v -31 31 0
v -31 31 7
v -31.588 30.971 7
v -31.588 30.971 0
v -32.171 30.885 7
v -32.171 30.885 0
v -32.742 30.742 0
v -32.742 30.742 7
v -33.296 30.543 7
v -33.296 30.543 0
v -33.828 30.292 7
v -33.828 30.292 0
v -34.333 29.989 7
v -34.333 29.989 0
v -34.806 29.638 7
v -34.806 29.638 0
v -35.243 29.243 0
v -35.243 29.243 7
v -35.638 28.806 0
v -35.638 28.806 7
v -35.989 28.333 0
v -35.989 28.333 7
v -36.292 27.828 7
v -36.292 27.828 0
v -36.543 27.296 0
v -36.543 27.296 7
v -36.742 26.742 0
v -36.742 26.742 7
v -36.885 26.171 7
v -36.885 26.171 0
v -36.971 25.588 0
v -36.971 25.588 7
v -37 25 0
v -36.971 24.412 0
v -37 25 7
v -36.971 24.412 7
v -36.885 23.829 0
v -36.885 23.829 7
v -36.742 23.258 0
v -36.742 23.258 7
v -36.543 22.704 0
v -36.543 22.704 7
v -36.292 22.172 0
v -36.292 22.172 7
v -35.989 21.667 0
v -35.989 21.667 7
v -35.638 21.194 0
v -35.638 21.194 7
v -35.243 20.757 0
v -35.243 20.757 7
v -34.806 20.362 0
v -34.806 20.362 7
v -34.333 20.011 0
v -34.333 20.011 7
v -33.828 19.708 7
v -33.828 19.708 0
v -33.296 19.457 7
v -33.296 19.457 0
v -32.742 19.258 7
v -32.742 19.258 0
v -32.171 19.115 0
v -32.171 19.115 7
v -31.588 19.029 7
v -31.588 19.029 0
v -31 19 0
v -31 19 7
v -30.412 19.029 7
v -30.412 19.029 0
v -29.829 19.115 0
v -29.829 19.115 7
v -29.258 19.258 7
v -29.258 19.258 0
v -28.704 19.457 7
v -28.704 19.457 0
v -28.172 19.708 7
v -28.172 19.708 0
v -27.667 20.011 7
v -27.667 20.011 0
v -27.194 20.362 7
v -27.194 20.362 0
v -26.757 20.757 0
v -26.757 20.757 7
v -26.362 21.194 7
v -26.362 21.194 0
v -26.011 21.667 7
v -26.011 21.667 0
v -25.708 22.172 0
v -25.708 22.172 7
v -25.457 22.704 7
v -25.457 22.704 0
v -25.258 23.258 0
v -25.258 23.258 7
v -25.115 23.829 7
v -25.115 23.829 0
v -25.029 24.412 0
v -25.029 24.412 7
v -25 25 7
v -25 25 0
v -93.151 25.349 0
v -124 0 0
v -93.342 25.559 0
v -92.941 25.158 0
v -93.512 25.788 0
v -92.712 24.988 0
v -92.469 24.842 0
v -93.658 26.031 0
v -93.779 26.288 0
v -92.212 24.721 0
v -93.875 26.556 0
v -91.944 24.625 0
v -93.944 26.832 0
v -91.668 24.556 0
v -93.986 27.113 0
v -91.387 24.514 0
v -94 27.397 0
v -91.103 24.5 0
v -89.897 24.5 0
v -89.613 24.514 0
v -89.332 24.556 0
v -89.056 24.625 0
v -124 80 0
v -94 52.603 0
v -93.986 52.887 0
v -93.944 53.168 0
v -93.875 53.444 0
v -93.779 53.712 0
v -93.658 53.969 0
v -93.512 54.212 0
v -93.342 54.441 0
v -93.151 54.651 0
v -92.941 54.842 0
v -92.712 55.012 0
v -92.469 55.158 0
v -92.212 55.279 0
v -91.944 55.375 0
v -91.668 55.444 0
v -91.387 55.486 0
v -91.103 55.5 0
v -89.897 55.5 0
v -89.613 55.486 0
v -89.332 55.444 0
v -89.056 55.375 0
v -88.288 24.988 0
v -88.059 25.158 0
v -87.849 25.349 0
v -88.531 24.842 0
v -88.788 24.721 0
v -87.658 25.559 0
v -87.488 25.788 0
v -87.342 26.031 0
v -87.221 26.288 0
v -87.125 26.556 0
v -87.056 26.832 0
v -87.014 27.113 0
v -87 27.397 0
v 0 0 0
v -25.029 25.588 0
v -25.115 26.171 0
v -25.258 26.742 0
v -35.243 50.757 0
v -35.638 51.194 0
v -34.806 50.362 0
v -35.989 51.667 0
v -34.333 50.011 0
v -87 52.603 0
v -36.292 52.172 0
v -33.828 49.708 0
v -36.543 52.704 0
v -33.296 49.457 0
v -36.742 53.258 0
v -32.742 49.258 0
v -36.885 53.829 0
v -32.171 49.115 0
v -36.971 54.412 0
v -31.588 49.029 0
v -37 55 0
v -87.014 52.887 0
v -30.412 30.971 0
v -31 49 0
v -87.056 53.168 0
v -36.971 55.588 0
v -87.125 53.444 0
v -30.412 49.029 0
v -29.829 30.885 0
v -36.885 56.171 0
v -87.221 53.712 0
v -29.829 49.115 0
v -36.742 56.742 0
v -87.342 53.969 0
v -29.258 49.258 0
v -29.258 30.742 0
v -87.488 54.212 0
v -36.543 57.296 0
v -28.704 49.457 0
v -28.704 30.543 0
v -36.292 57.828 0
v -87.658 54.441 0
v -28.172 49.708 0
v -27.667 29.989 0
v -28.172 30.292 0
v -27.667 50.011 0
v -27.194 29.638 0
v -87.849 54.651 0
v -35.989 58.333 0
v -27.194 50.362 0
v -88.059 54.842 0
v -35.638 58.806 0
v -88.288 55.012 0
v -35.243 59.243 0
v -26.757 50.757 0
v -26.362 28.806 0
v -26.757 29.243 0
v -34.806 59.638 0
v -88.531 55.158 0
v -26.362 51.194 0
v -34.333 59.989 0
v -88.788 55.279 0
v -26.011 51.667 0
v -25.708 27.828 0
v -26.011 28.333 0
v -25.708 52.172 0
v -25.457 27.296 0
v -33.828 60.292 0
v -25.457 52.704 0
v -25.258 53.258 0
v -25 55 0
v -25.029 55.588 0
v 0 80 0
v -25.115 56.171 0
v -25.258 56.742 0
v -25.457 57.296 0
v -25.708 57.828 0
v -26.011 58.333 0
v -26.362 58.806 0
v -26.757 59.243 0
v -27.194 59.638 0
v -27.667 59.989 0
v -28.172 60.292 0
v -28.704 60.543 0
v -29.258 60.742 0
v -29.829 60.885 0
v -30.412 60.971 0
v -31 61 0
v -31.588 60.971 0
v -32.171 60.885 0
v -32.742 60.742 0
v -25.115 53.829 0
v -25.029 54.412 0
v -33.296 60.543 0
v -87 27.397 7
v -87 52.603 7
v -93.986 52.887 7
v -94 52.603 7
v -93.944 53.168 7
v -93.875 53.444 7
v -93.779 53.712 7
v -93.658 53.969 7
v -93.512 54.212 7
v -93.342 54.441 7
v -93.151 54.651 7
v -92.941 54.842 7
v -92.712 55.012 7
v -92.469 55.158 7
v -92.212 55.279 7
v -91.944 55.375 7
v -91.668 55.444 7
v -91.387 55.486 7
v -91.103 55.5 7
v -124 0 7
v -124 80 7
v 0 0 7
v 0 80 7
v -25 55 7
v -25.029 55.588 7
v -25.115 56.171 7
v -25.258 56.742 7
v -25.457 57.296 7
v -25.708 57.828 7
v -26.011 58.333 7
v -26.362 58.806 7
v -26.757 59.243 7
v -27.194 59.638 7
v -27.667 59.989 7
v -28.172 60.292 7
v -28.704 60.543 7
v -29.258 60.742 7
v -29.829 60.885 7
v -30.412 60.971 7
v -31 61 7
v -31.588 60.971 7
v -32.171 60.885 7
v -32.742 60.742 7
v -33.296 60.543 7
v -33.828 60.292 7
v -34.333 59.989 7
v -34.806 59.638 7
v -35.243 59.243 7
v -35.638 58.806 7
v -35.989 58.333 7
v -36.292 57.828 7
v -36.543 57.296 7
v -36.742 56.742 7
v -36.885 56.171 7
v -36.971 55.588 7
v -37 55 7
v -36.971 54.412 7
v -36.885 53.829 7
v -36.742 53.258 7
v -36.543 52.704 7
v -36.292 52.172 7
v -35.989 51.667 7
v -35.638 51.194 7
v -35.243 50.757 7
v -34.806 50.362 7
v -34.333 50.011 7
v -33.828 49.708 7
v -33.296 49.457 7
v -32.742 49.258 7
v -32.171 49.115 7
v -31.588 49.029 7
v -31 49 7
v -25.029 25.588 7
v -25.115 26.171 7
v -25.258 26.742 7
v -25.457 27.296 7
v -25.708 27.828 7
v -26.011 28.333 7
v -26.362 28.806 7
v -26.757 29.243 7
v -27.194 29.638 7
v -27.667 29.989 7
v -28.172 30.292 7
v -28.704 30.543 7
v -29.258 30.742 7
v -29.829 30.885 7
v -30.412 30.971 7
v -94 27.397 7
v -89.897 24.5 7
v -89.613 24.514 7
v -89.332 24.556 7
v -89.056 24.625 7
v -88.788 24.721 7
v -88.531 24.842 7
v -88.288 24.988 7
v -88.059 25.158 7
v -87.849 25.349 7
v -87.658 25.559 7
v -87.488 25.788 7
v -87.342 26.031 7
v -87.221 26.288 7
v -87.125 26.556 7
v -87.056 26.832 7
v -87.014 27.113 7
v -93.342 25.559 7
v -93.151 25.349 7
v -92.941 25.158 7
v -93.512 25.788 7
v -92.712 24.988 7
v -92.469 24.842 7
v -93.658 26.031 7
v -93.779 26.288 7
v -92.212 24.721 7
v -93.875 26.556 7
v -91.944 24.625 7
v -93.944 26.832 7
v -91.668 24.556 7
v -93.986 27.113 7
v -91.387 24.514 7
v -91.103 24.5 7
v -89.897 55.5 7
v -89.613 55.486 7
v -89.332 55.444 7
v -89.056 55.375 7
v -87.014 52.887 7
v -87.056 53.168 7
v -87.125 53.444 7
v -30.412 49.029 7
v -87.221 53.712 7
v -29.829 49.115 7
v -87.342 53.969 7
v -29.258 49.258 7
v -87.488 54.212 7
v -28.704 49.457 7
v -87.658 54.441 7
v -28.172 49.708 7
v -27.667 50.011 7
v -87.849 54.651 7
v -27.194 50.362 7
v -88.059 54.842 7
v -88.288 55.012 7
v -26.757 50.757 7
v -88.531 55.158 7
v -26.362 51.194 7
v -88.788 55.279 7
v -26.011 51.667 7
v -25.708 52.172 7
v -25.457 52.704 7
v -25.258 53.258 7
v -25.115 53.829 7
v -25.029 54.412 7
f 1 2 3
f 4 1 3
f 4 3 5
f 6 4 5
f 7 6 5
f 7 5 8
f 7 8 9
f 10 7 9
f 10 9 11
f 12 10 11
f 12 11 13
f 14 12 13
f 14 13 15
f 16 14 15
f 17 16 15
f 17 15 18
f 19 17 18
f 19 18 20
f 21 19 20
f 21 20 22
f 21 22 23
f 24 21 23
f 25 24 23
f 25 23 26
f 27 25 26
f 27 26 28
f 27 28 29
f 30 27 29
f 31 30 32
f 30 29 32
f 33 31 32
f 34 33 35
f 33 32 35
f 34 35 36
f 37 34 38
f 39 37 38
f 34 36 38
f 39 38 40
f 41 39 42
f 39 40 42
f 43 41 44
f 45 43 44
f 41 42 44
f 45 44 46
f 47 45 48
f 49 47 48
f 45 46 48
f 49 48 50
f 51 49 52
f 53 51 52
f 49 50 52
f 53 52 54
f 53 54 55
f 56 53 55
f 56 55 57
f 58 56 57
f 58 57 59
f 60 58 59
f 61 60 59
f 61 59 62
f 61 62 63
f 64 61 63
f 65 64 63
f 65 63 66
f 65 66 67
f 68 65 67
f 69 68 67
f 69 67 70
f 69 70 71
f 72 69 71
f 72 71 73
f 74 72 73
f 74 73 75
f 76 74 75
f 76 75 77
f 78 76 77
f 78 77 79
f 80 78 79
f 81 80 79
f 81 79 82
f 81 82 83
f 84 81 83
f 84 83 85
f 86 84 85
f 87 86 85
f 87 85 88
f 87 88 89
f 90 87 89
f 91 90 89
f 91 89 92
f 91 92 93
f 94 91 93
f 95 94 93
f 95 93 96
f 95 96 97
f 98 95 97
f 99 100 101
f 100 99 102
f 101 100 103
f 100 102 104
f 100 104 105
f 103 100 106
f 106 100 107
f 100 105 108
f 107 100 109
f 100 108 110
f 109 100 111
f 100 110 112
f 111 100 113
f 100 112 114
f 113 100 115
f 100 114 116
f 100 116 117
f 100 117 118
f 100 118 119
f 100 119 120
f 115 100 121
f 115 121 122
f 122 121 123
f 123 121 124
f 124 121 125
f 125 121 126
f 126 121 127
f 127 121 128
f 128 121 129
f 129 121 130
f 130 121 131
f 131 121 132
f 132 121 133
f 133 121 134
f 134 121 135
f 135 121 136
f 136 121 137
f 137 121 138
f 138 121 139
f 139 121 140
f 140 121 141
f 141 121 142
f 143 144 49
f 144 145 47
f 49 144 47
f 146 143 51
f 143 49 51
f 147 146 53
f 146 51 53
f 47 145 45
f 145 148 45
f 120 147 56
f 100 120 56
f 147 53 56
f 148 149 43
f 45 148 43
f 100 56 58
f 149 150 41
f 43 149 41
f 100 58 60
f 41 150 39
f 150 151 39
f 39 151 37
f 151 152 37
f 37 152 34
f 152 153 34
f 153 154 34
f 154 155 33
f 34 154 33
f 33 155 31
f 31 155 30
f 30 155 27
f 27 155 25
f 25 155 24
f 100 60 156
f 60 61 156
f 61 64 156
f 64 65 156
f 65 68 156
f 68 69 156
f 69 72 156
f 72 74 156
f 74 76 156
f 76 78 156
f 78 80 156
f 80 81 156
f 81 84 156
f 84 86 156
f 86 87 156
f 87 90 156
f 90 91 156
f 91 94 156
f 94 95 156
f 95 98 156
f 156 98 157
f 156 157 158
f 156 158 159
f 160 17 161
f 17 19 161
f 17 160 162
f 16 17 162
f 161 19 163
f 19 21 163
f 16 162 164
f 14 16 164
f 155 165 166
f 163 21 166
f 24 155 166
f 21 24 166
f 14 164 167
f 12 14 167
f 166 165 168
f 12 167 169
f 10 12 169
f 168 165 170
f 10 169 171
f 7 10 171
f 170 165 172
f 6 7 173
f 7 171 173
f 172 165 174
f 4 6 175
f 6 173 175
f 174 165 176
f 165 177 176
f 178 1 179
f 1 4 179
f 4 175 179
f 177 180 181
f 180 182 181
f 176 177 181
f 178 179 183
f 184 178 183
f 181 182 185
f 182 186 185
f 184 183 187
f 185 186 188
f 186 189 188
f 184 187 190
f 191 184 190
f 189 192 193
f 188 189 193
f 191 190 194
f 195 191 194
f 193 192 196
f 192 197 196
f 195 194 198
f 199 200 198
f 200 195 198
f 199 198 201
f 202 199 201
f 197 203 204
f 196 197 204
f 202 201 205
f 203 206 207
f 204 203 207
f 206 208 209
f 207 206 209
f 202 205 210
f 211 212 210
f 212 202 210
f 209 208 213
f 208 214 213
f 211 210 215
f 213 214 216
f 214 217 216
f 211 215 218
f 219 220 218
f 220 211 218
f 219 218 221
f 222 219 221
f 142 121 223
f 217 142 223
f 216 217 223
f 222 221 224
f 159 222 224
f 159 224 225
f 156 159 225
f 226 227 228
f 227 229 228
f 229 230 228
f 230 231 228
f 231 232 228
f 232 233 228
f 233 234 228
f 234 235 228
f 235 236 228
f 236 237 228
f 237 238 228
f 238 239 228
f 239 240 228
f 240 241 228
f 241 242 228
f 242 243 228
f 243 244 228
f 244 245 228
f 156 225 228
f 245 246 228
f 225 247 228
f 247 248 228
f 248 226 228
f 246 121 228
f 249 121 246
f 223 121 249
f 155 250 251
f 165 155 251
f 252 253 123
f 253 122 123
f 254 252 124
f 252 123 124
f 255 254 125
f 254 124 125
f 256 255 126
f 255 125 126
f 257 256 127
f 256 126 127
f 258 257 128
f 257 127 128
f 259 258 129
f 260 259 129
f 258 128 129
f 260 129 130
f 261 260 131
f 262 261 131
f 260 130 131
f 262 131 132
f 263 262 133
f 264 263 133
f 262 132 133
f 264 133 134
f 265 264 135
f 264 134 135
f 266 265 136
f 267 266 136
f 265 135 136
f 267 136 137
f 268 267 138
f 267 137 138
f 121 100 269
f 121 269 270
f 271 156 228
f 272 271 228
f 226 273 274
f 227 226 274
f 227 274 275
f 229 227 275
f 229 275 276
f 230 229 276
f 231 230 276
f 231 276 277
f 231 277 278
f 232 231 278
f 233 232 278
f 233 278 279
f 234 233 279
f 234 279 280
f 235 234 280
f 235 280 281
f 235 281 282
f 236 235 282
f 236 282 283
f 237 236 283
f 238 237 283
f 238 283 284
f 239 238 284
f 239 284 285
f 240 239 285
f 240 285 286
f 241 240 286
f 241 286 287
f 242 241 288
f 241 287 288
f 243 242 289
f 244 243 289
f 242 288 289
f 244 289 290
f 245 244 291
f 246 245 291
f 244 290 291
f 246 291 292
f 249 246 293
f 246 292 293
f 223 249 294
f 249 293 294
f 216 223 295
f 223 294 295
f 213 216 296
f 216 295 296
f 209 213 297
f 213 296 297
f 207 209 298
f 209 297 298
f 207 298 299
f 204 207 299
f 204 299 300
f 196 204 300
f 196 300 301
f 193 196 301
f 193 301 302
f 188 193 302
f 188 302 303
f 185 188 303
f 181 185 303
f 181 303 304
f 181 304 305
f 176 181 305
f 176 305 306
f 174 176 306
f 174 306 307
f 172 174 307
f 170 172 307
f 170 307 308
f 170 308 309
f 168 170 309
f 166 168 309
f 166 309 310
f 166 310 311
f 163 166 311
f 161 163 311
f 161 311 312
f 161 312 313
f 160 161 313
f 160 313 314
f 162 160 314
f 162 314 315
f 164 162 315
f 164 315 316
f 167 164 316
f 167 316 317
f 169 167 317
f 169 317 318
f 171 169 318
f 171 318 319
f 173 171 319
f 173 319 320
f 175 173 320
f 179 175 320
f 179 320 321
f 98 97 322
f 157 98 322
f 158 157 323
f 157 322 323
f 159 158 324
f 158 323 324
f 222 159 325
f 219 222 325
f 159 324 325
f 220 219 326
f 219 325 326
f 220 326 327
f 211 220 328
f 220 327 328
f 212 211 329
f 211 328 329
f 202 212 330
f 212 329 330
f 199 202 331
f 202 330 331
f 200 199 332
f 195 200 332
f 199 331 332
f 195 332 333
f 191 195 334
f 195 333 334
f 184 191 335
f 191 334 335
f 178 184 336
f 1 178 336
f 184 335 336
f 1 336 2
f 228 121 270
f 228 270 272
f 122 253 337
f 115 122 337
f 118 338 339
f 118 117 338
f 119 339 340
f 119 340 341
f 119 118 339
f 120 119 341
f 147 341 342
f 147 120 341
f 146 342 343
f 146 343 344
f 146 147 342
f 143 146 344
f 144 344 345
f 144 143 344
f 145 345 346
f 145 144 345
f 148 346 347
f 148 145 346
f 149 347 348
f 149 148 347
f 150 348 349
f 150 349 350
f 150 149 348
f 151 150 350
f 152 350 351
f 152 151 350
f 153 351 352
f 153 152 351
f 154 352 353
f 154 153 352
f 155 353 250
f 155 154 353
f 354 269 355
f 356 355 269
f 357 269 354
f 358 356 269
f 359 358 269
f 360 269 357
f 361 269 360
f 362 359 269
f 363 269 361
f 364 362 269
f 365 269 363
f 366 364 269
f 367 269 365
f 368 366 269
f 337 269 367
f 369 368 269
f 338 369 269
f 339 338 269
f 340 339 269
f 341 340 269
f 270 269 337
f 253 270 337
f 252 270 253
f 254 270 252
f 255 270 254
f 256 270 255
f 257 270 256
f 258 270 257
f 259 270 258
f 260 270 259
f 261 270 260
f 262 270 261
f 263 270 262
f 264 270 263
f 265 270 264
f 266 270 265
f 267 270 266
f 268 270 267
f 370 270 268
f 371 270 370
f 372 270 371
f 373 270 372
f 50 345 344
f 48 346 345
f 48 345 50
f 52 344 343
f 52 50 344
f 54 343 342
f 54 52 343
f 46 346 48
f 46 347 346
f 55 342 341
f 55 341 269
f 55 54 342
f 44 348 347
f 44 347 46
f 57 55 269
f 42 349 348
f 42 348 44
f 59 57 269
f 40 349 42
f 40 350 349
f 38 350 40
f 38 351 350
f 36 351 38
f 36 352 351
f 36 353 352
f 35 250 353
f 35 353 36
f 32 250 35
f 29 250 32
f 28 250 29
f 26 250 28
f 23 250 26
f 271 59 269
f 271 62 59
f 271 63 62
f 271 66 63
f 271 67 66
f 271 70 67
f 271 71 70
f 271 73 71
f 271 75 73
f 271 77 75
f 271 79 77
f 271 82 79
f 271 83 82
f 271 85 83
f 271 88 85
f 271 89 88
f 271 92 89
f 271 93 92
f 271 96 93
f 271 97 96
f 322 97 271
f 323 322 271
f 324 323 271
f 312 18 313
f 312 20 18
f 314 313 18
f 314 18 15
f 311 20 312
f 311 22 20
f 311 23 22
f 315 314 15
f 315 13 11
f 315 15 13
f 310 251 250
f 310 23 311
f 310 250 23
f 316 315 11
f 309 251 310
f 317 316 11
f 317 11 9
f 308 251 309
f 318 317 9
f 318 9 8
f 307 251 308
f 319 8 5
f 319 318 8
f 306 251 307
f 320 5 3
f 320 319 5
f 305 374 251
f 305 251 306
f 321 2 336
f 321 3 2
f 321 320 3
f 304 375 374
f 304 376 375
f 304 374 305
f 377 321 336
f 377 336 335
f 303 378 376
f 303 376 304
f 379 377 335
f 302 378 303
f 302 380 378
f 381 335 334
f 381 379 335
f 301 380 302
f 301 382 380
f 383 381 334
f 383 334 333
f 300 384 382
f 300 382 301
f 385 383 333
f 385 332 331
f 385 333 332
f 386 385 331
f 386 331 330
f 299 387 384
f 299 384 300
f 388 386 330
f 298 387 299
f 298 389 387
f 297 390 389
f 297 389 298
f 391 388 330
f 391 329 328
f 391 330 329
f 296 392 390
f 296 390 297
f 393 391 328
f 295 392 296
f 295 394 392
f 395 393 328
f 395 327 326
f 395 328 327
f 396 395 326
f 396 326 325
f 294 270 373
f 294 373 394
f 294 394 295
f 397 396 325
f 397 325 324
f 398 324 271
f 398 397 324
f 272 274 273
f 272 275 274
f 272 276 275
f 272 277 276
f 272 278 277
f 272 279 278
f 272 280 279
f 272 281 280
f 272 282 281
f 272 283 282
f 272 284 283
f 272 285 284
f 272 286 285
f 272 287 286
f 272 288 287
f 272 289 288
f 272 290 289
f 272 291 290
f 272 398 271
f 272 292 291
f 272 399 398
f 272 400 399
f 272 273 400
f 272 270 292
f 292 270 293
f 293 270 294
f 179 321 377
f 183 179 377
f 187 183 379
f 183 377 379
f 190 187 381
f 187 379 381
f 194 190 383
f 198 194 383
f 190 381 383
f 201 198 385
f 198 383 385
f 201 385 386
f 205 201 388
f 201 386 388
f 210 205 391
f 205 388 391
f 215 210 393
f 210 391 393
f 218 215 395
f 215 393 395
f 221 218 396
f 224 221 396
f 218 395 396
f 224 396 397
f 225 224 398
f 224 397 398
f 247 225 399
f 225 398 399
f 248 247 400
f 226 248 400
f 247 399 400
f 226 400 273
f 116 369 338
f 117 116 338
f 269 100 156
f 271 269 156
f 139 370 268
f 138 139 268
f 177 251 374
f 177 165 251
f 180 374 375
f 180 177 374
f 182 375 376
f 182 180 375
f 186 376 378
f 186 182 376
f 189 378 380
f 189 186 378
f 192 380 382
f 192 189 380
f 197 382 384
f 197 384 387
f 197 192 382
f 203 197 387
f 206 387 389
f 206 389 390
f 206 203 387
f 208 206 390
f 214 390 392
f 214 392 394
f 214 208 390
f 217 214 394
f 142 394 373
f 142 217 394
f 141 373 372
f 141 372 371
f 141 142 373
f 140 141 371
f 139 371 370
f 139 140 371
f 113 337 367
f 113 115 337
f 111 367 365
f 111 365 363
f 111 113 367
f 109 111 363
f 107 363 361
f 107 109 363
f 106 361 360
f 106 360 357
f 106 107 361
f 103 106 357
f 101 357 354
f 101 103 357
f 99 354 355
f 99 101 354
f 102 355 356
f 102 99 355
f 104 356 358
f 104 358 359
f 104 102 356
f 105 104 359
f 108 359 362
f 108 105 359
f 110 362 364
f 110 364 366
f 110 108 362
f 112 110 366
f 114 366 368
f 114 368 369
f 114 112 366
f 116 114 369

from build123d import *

# Parameters (mm, degrees)
F0_W     = 124
F0_H     = 80
F1_DEPTH = 7
F3_DEPTH = 25
F5_DEPTH = 25
F6_R     = 2.897056


with BuildPart() as f1:
    # F0 (on Top) → F1 (new body)
    with BuildSketch(Plane.XY):
        with Locations((-62, 40)):
            Rectangle(F0_W, F0_H)
    extrude(amount=F1_DEPTH)

    # F2 (on face) → F3 (cut)
    with BuildSketch(Plane.XY.offset(7)):
        with BuildLine():
            ThreePointArc((-25, 55), (-35.242641, 59.242641), (-31, 49))
            ThreePointArc((-31, 49), (-26.757359, 50.757359), (-25, 55))
        make_face()
        with BuildLine():
            ThreePointArc((-25, 25), (-26.757359, 29.242641), (-31, 31))
            ThreePointArc((-31, 31), (-35.242641, 20.757359), (-25, 25))
        make_face()
    extrude(amount=-F3_DEPTH, mode=Mode.SUBTRACT)

    # F4 (on face) → F5 (cut)
    with BuildSketch(Plane.XY.offset(7)):
        Polygon((-94, 55.5), (-94, 40), (-94, 24.5), (-87, 24.5), (-87, 55.5), align=None)
    extrude(amount=-F5_DEPTH, mode=Mode.SUBTRACT)

    # F6
    f6_edges = [f1.edges().sort_by_distance(p)[0] for p in [
        (-87, 55.5, 3.5),
        (-94, 55.5, 3.5),
        (-87, 24.5, 3.5),
        (-94, 24.5, 3.5),
    ]]
    fillet(f6_edges, radius=F6_R)


solid = f1.part
